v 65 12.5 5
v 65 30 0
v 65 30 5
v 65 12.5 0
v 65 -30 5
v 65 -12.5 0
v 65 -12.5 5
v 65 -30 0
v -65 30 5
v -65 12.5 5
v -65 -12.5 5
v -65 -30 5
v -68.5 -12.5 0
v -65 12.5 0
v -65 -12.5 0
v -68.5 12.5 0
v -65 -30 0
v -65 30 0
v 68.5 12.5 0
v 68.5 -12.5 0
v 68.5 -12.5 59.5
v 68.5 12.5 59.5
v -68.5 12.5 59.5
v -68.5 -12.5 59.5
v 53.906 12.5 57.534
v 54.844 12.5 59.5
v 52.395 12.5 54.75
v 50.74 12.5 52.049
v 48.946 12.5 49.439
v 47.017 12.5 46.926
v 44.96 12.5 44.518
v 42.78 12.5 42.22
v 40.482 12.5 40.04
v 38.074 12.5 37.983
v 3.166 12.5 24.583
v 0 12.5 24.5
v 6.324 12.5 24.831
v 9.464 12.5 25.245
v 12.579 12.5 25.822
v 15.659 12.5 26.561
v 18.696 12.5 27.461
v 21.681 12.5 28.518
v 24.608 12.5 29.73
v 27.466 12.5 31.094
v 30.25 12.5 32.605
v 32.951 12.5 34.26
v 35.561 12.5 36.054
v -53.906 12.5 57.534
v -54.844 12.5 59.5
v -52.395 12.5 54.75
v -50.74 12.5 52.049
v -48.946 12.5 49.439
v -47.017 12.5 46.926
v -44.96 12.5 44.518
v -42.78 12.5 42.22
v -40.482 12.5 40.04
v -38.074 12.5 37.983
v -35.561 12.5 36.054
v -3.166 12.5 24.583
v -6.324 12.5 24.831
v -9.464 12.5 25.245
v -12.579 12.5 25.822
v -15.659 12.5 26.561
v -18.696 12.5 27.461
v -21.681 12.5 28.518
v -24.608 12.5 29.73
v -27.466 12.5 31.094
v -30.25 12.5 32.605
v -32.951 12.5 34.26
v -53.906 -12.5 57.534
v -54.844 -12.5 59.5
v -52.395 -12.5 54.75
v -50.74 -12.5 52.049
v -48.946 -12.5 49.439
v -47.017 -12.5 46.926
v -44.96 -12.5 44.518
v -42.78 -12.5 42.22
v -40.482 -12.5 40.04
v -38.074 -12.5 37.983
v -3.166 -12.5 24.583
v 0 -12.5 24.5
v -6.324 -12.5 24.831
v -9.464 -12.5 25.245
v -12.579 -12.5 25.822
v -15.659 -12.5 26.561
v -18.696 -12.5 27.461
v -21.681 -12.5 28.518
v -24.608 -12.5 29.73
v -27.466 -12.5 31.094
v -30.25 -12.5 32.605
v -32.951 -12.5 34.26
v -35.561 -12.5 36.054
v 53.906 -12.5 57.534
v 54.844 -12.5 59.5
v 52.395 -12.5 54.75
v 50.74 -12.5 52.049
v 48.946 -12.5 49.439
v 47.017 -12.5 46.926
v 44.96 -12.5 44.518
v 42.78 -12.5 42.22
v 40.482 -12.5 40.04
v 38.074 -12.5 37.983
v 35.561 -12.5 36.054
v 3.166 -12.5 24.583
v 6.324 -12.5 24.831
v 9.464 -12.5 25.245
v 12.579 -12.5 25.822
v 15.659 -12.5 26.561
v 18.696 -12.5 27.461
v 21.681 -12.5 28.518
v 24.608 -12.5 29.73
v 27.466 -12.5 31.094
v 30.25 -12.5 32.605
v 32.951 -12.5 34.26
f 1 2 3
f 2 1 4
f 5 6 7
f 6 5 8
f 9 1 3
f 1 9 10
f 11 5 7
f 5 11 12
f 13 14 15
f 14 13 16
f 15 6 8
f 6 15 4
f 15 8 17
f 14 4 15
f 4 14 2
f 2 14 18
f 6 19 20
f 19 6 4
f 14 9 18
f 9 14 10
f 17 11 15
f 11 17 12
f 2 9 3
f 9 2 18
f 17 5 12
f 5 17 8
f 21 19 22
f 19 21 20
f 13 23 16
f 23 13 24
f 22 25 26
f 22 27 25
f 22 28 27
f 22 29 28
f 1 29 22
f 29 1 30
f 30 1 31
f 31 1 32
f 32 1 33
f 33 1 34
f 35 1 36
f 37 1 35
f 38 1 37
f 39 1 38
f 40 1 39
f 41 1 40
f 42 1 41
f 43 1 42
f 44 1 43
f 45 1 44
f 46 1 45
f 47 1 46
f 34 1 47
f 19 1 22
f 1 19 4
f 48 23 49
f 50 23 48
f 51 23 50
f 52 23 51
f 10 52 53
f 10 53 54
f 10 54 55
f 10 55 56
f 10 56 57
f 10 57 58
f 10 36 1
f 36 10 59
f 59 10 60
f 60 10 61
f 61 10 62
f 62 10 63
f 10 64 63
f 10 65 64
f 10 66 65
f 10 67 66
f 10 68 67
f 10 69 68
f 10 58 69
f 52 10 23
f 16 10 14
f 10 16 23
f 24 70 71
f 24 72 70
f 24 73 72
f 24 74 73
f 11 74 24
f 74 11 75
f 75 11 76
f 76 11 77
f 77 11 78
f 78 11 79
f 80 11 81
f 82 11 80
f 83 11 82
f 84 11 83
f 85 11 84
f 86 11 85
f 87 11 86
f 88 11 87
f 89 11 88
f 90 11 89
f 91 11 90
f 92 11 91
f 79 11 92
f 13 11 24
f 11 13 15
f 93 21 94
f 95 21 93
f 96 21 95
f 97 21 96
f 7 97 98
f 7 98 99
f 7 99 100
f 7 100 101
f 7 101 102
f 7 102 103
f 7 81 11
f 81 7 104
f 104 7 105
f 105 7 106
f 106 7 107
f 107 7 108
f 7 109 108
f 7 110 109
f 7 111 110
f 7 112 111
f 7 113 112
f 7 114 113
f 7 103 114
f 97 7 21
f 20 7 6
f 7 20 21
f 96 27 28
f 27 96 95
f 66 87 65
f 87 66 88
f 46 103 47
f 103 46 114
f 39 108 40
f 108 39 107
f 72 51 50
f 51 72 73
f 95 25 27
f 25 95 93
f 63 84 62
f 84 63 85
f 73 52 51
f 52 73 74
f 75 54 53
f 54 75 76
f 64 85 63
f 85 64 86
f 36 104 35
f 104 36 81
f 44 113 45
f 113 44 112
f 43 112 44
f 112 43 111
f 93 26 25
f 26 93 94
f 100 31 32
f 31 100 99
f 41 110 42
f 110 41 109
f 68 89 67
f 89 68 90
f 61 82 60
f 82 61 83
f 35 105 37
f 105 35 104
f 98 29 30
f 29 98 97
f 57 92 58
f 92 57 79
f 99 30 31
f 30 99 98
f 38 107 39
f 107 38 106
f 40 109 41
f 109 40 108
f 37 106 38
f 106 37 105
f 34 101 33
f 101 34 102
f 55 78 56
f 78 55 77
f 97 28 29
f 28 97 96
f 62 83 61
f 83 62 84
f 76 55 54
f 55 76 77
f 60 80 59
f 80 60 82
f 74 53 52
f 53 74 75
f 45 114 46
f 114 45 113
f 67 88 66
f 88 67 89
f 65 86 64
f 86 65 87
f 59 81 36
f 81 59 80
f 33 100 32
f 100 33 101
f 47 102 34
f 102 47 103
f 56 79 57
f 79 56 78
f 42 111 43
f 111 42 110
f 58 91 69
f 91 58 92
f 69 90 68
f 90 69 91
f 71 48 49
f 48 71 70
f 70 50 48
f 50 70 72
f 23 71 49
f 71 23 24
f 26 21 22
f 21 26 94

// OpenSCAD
// ==========================================
// TESTING STAND MODULE (SUPPORT-FREE)
// ==========================================
stand_center_height  = 85;  // Height of the robot's center axis (gives 23mm ground clearance)
stand_cradle_dia     = 121; // 1mm extra clearance so the 120mm shroud drops in easily
stand_thickness      = 25;  // Narrower than the 33mm shroud to prevent rubbing
stand_base_x         = 130; // Footprint width for stability
stand_base_y         = 60;  // Footprint depth for stability

// --- NEW HEIGHT CONTROL ---
stand_support_height = 35;  // How far up the side of the robot the prongs reach from the bottom of the curve (Max is 60.5)

module TestingStand() {
    // Calculate the absolute Z height of the lowest point of the cradle curve
    cradle_bottom_z = stand_center_height - (stand_cradle_dia / 2);
    prong_top_z = cradle_bottom_z + stand_support_height;
    
    difference() {
        // Main Positive Geometry
        union() {
            // Flat Base Plate (Rests flush at Z=0)
            translate([0, 0, 2.5])
                cube([stand_base_x, stand_base_y, 5], center = true);
            
            // Upright Support Block
            translate([0, 0, stand_center_height / 2])
                cube([stand_cradle_dia + 16, stand_thickness, stand_center_height], center = true);
        }
        
        // Subtractions
        // 1. The U-Shape Cradle Cutout
        translate([0, 0, stand_center_height])
            rotate([90, 0, 0])
            cylinder(d = stand_cradle_dia, h = stand_thickness + 2, center = true, $fn=120);
            
        // 2. Dynamic Chop-off to control prong height
        // We place a massive subtraction cube directly at the exact Z-height where the prongs should end
        translate([0, 0, prong_top_z + 50])
            cube([stand_base_x + 50, stand_thickness + 2, 100], center = true);
    }
}

// Render the stand centered perfectly at the origin for slicing
TestingStand();
